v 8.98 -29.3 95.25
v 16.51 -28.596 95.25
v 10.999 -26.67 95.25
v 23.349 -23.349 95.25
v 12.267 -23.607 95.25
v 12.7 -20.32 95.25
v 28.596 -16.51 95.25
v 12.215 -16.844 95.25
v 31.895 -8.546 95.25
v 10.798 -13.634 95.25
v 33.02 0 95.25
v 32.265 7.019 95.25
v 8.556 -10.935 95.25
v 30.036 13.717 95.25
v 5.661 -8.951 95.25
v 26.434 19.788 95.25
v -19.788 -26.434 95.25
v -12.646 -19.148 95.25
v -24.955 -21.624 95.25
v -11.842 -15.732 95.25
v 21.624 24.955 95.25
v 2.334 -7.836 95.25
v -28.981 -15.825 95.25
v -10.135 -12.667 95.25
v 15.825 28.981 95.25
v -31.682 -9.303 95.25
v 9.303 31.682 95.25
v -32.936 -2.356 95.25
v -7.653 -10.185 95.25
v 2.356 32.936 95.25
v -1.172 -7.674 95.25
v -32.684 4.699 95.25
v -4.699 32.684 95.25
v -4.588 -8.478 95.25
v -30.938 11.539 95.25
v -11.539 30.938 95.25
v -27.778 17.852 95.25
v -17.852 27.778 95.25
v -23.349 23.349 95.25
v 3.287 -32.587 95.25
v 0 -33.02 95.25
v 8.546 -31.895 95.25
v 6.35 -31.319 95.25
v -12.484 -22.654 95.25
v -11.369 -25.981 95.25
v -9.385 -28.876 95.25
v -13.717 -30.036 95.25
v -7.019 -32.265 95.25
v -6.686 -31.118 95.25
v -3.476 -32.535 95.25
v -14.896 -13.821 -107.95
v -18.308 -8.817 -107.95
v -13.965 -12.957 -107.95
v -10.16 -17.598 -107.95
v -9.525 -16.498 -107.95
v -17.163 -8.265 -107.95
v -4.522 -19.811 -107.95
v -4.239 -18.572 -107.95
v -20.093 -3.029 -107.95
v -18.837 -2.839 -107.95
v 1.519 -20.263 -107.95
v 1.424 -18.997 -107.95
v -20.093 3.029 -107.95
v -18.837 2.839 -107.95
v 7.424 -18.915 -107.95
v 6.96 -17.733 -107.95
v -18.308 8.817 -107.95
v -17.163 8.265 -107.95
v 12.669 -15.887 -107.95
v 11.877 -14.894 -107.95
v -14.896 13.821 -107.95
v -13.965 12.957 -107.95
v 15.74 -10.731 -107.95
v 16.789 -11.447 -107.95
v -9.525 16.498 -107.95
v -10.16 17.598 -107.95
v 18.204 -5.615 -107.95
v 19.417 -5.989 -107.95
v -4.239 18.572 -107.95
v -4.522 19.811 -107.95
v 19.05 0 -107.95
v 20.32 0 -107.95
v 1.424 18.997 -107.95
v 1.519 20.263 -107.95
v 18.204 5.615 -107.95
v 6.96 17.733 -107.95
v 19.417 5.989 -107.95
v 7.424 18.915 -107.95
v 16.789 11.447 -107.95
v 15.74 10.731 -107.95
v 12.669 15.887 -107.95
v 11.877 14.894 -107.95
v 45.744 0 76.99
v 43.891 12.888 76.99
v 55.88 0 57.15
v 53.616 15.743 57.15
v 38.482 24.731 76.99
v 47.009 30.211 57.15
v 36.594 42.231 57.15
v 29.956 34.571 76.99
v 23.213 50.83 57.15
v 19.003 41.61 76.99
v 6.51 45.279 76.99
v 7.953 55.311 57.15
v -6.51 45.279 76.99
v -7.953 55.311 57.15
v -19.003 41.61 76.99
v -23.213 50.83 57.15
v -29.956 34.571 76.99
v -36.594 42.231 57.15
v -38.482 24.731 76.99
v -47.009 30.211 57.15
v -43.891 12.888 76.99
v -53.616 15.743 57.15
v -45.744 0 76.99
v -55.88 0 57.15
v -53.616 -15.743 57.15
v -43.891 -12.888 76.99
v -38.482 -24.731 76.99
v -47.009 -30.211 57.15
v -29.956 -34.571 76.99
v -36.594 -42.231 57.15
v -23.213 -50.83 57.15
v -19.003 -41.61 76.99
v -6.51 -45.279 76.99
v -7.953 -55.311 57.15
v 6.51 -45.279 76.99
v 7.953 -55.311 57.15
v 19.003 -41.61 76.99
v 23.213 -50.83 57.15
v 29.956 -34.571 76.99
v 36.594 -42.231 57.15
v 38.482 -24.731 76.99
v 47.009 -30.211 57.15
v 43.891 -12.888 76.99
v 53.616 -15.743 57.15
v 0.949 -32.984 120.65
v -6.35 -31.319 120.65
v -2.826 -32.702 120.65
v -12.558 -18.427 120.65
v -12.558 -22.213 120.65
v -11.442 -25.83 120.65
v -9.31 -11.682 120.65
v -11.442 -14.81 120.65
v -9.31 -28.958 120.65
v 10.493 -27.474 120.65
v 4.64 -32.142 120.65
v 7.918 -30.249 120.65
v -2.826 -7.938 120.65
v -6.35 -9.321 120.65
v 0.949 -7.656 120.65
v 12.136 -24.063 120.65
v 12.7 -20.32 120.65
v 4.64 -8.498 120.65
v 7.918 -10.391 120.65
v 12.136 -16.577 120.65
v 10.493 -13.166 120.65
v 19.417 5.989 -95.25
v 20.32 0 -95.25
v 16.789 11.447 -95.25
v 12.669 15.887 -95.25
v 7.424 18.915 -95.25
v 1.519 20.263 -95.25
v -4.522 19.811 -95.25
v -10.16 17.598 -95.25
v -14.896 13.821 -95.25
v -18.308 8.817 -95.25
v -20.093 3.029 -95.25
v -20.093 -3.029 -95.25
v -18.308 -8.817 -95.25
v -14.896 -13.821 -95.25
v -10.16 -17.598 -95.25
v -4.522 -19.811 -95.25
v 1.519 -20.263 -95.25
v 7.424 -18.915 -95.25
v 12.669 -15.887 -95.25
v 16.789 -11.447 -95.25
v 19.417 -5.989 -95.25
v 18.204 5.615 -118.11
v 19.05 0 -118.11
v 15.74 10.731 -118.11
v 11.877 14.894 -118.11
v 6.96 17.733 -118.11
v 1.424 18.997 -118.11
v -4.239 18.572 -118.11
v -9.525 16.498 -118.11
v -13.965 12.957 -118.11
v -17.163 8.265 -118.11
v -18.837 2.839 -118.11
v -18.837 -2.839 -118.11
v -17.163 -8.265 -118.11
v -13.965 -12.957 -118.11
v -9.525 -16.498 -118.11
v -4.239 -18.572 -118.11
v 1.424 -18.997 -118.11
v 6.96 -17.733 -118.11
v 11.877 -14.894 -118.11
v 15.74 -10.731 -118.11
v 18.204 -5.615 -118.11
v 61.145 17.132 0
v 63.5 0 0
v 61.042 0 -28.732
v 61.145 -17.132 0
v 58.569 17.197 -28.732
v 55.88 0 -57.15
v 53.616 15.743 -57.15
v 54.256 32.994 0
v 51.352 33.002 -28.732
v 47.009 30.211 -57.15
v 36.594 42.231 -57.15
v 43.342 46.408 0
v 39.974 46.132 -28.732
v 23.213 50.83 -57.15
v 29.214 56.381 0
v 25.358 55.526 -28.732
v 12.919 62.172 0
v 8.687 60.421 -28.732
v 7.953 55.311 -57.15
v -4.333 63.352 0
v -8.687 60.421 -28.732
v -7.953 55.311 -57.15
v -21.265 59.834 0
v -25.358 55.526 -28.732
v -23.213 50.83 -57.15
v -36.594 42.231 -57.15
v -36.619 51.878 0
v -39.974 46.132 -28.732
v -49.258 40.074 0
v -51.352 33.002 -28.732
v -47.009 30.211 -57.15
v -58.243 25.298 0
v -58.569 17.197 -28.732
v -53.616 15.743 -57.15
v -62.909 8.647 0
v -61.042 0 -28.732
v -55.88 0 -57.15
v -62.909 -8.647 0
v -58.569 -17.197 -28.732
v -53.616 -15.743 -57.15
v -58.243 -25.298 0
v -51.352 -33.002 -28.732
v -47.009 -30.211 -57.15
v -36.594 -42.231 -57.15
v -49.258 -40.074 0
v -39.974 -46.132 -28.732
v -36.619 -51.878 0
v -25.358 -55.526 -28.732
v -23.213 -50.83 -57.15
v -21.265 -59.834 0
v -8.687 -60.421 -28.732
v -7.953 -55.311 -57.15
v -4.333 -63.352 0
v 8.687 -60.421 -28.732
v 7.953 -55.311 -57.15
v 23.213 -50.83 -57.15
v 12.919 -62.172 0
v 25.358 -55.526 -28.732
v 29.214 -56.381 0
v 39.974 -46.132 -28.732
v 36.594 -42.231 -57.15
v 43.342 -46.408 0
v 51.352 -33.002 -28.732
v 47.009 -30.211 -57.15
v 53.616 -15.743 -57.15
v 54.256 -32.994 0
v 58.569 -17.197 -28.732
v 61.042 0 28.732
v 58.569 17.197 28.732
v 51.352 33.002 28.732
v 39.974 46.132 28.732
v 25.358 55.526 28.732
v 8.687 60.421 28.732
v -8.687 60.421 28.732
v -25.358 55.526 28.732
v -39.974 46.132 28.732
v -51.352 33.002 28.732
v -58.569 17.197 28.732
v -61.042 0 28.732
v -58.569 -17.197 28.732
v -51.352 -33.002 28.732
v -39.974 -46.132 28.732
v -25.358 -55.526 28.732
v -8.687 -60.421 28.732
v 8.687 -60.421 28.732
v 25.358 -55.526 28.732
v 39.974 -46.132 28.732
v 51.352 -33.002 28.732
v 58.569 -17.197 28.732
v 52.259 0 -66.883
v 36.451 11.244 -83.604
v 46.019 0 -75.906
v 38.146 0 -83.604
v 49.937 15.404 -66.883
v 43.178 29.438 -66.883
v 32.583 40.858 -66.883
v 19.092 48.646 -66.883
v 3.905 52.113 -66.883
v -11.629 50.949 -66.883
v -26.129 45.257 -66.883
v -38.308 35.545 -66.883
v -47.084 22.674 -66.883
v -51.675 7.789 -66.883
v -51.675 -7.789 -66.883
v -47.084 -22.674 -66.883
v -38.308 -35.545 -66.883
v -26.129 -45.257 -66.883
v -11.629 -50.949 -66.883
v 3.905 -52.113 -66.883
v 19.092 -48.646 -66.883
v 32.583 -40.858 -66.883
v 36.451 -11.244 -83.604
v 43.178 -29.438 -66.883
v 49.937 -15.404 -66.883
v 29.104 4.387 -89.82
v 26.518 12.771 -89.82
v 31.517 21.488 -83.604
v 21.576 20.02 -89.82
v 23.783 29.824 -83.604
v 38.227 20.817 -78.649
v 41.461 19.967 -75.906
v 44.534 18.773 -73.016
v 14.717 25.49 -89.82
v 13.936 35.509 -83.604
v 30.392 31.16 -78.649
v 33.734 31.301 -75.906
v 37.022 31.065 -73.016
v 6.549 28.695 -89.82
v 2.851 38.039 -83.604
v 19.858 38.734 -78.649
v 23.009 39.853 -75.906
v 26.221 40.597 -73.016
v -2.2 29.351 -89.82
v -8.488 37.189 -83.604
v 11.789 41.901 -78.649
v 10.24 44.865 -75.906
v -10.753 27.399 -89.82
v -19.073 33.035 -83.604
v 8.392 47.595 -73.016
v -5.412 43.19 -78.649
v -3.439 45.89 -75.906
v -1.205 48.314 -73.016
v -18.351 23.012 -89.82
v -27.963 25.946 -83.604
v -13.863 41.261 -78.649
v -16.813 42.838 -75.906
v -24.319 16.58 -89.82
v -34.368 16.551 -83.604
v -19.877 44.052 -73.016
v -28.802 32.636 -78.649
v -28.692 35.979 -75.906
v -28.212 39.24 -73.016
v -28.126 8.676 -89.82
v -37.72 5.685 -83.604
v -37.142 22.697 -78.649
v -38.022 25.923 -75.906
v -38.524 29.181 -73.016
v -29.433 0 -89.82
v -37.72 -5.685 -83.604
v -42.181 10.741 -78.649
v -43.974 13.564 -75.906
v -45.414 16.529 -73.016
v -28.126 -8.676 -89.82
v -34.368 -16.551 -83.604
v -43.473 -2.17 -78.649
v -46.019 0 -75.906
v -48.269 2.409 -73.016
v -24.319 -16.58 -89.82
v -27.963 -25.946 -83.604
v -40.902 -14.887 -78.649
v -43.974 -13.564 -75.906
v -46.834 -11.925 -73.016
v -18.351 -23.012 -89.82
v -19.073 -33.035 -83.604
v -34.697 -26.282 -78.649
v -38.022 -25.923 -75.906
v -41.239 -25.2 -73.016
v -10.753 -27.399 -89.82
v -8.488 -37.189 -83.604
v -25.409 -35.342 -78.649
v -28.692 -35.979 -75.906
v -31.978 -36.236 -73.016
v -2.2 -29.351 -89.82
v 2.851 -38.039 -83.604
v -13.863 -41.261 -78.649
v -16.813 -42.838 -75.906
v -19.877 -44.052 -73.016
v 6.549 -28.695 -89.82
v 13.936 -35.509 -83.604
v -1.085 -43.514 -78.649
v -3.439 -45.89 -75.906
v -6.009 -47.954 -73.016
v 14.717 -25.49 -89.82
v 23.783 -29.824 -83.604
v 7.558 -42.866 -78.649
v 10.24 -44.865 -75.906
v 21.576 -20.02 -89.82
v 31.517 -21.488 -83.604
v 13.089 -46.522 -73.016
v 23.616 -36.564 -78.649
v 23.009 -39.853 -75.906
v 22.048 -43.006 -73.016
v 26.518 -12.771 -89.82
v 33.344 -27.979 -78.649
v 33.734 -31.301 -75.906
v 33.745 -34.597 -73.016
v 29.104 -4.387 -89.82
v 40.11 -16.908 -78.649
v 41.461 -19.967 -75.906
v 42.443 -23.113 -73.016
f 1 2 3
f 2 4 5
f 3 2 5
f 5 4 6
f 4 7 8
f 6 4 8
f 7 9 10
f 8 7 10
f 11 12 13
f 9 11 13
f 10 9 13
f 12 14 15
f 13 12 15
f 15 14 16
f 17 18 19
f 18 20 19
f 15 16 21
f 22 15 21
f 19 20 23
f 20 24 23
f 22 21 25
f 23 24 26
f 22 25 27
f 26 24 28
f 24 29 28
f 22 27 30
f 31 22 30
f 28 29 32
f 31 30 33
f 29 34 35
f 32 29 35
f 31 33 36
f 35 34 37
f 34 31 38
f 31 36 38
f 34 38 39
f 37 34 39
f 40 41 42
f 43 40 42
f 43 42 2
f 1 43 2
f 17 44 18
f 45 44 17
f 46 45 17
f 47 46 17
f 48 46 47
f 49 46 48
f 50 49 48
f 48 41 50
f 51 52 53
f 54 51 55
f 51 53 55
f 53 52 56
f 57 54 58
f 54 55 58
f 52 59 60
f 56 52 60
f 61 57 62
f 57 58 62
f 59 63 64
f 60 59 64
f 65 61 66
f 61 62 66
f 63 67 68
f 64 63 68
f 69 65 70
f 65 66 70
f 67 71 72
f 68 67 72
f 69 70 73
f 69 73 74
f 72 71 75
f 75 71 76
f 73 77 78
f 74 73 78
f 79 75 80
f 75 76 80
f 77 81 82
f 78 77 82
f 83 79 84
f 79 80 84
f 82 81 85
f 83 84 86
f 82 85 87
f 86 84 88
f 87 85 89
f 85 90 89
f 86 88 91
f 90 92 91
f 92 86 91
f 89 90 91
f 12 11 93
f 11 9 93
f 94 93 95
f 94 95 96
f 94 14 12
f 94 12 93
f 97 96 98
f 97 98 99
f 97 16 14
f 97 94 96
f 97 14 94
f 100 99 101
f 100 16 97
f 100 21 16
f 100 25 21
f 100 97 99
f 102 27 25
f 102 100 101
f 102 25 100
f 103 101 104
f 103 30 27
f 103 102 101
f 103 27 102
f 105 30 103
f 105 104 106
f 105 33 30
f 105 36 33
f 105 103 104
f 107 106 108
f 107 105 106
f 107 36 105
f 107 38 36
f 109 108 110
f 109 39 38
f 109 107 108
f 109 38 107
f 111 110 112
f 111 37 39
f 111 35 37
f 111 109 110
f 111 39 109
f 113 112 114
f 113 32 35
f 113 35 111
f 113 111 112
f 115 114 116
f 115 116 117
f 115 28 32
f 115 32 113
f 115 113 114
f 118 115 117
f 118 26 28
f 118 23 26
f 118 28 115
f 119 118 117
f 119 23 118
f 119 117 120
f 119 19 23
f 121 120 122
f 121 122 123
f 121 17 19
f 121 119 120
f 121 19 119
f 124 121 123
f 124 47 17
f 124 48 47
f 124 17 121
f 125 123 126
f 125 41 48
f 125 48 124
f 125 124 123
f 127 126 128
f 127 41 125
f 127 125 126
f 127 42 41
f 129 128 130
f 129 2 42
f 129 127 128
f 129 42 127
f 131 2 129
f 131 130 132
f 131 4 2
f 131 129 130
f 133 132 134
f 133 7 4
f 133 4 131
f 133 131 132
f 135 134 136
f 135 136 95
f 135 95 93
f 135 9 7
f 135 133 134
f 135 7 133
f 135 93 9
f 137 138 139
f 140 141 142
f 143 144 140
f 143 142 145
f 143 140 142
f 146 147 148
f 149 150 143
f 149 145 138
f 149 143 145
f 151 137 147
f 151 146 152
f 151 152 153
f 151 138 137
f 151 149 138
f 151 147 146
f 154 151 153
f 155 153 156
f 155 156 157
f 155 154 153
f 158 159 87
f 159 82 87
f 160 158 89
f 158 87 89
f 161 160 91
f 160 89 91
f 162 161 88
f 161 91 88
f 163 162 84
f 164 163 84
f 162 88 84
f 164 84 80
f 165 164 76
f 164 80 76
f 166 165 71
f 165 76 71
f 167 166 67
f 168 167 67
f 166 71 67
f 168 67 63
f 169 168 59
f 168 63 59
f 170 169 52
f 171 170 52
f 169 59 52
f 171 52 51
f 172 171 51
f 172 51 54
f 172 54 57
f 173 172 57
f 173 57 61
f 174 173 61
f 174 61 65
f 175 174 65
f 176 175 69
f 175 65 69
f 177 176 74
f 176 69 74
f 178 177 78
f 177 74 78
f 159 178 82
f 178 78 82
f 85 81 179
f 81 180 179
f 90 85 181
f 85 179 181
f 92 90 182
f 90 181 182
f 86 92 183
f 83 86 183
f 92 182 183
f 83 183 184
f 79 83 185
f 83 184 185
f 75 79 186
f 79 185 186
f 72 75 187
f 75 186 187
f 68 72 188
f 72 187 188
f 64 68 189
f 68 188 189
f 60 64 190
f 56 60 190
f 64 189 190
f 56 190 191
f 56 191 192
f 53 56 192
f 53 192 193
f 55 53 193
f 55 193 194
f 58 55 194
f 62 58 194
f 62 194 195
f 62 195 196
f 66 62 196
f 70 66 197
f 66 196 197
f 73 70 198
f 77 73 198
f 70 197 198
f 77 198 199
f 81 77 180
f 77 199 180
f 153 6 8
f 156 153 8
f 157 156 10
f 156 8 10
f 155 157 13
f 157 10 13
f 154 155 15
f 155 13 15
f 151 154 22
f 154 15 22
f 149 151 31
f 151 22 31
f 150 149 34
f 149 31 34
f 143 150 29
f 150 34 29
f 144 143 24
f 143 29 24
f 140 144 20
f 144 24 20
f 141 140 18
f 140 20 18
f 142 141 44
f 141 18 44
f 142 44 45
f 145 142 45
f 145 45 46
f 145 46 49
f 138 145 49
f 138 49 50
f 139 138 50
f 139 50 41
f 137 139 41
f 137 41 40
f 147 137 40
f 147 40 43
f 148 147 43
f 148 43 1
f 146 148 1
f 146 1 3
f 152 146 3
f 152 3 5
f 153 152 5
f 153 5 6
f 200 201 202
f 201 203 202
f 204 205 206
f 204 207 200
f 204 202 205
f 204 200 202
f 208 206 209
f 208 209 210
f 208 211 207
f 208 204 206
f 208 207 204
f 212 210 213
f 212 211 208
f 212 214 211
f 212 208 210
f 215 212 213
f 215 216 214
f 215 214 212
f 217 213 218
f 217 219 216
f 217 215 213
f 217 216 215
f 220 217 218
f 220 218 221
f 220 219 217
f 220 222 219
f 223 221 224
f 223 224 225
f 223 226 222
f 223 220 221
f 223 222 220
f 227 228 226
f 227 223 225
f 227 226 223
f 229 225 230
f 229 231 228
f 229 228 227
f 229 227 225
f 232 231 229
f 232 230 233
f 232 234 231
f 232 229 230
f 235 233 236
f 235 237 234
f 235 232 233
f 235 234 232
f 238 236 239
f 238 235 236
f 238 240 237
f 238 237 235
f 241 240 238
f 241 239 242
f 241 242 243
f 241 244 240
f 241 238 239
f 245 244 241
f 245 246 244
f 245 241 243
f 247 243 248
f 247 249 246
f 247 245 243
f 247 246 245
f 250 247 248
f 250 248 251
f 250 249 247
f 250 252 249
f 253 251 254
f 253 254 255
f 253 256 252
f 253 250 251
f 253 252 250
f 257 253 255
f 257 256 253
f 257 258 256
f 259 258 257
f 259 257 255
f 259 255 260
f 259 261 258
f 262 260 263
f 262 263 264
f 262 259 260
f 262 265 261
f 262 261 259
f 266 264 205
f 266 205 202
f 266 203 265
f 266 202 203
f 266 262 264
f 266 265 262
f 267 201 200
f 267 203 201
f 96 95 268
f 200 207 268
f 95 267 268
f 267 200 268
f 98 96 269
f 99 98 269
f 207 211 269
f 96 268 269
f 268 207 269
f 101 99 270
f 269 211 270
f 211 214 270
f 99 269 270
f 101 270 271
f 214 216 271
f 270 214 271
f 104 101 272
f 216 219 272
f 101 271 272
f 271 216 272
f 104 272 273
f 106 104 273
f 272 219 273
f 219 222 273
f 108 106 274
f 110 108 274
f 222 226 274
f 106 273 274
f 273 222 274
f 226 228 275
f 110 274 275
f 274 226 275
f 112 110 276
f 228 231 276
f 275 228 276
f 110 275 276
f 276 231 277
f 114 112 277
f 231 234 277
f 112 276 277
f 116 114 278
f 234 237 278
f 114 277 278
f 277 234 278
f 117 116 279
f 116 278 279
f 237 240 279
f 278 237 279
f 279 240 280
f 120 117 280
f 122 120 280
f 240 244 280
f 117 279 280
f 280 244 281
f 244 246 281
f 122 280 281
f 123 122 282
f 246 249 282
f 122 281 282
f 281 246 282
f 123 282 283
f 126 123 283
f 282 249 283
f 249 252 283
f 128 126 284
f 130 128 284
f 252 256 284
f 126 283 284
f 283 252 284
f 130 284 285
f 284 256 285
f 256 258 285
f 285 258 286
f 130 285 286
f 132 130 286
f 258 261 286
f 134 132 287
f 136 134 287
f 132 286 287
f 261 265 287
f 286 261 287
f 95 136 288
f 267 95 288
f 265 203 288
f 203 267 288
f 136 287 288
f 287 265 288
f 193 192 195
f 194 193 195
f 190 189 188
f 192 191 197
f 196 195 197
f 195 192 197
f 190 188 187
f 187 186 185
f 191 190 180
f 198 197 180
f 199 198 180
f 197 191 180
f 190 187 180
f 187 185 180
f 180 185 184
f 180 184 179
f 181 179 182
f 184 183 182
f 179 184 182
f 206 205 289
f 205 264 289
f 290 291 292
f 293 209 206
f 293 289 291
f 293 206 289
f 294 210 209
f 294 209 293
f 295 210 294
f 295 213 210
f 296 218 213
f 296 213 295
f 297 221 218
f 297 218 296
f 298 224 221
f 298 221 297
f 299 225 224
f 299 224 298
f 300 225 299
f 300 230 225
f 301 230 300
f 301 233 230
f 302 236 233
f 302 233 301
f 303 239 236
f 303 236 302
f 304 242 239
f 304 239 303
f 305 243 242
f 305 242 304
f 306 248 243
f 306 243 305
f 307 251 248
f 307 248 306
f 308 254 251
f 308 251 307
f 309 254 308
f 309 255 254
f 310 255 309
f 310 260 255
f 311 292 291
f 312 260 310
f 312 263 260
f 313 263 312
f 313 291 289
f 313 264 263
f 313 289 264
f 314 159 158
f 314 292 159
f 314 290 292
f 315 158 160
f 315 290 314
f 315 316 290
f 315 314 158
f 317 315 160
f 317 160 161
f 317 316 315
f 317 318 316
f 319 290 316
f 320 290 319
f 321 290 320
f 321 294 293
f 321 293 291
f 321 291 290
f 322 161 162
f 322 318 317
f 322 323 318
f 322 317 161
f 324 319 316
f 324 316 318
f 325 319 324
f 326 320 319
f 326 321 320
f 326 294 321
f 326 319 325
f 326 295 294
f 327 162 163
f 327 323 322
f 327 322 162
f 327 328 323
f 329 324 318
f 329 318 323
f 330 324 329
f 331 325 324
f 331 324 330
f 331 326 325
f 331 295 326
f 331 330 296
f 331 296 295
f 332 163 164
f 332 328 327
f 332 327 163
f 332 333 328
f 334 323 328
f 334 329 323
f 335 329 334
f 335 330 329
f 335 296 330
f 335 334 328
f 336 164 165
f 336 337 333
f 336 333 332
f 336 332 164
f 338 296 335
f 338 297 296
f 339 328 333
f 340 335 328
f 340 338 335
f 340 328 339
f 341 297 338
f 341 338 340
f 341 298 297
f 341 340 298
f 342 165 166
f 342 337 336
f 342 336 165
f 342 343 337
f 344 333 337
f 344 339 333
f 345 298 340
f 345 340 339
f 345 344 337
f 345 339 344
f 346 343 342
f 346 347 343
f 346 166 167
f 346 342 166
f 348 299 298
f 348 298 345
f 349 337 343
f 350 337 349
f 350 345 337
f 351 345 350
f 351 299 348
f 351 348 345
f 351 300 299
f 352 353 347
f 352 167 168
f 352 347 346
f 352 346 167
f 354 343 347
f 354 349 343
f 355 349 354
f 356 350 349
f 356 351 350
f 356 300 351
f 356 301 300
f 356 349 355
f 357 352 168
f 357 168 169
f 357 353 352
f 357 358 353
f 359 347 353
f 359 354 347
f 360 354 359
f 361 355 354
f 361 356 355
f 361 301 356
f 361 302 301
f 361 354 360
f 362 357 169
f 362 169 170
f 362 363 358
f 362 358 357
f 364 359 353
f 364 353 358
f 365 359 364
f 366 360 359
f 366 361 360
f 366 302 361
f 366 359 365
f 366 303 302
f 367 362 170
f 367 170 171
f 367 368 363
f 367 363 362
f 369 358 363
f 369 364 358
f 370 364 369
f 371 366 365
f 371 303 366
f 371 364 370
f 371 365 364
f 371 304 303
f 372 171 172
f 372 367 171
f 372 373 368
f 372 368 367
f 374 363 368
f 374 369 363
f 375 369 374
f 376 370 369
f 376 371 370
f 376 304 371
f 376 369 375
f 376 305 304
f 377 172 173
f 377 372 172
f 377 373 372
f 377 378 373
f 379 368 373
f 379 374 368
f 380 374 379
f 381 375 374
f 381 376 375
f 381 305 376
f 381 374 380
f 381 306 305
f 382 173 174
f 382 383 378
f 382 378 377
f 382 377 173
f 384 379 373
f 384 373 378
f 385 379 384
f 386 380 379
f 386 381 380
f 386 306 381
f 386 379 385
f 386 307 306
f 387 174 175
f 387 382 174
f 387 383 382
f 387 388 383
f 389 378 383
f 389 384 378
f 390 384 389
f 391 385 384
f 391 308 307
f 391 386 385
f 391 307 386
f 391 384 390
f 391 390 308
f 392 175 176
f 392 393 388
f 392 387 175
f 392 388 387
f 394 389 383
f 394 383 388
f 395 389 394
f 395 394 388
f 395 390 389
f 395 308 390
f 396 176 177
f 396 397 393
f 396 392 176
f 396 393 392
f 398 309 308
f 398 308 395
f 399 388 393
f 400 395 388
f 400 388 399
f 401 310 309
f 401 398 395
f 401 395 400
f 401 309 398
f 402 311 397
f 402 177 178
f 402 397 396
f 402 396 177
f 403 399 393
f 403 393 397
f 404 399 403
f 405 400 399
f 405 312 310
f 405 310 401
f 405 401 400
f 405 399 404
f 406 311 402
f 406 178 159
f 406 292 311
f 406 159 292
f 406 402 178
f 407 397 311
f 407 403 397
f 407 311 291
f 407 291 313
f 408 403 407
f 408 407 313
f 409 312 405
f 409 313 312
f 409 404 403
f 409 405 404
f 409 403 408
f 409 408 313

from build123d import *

# Parameters (mm, degrees)
SKETCH4_R            = 12.7
BAG_ATTACHMENT_DEPTH = 25.4


with BuildPart() as part:
    # Sketch1 → body (revolve)
    with BuildSketch(Plane(origin=(0, 0, 0), x_dir=(1, 0, 0), z_dir=(0, 1, 0))):
        with BuildLine():
            Line((0, 95.25), (0, -95.25))
            Line((0, -95.25), (33.02, -95.25))
            add(Edge.make_bspline(
                [(55.88, -57.15), (52.333253403, -64.649759535), (45.965562244, -78.114536673), (36.994334659, -89.98935048), (33.02, -95.25)],
                knots=[0, 0, 0, 0, 0.556990989, 1, 1, 1, 1], degree=3))
            add(Edge.make_bspline(
                [(55.88, -57.15), (58.418345497, -44.49907482), (62.211374207, -25.594901819), (63.179693062, -6.361990172), (63.5, 0)],
                knots=[0, 0, 0, 0, 0.669213363, 1, 1, 1, 1], degree=3))
            add(Edge.make_bspline(
                [(55.88, 57.15), (58.418345497, 44.49907482), (62.211374207, 25.594901819), (63.179693062, 6.361990172), (63.5, 0)],
                knots=[0, 0, 0, 0, 0.669213363, 1, 1, 1, 1], degree=3))
            add(Edge.make_bspline(
                [(20.32, 95.25), (27.263983104, 91.241807371), (42.563906598, 82.410414831), (54.075514966, 66.14341921), (55.88, 57.15)],
                knots=[0, 0, 0, 0, 0.453857374, 1, 1, 1, 1], degree=3))
            Line((20.32, 95.25), (20.32, 107.95))
            Line((20.32, 107.95), (19.05, 107.95))
            Line((19.05, 107.95), (19.05, 118.11))
            Line((19.05, 118.11), (0, 118.11))
            Line((0, 118.11), (0, 107.95))
            Line((0, 107.95), (0, 95.25))
        make_face()
    revolve(axis=Axis((0, 0, -95.25), (0, 0, 1)))

    # Sketch4 → bag_attachment (add)
    with BuildSketch(Plane.XY.offset(95.25)):
        with Locations((0, -20.32)):
            Circle(SKETCH4_R)
    extrude(amount=BAG_ATTACHMENT_DEPTH)


solid = part.part
